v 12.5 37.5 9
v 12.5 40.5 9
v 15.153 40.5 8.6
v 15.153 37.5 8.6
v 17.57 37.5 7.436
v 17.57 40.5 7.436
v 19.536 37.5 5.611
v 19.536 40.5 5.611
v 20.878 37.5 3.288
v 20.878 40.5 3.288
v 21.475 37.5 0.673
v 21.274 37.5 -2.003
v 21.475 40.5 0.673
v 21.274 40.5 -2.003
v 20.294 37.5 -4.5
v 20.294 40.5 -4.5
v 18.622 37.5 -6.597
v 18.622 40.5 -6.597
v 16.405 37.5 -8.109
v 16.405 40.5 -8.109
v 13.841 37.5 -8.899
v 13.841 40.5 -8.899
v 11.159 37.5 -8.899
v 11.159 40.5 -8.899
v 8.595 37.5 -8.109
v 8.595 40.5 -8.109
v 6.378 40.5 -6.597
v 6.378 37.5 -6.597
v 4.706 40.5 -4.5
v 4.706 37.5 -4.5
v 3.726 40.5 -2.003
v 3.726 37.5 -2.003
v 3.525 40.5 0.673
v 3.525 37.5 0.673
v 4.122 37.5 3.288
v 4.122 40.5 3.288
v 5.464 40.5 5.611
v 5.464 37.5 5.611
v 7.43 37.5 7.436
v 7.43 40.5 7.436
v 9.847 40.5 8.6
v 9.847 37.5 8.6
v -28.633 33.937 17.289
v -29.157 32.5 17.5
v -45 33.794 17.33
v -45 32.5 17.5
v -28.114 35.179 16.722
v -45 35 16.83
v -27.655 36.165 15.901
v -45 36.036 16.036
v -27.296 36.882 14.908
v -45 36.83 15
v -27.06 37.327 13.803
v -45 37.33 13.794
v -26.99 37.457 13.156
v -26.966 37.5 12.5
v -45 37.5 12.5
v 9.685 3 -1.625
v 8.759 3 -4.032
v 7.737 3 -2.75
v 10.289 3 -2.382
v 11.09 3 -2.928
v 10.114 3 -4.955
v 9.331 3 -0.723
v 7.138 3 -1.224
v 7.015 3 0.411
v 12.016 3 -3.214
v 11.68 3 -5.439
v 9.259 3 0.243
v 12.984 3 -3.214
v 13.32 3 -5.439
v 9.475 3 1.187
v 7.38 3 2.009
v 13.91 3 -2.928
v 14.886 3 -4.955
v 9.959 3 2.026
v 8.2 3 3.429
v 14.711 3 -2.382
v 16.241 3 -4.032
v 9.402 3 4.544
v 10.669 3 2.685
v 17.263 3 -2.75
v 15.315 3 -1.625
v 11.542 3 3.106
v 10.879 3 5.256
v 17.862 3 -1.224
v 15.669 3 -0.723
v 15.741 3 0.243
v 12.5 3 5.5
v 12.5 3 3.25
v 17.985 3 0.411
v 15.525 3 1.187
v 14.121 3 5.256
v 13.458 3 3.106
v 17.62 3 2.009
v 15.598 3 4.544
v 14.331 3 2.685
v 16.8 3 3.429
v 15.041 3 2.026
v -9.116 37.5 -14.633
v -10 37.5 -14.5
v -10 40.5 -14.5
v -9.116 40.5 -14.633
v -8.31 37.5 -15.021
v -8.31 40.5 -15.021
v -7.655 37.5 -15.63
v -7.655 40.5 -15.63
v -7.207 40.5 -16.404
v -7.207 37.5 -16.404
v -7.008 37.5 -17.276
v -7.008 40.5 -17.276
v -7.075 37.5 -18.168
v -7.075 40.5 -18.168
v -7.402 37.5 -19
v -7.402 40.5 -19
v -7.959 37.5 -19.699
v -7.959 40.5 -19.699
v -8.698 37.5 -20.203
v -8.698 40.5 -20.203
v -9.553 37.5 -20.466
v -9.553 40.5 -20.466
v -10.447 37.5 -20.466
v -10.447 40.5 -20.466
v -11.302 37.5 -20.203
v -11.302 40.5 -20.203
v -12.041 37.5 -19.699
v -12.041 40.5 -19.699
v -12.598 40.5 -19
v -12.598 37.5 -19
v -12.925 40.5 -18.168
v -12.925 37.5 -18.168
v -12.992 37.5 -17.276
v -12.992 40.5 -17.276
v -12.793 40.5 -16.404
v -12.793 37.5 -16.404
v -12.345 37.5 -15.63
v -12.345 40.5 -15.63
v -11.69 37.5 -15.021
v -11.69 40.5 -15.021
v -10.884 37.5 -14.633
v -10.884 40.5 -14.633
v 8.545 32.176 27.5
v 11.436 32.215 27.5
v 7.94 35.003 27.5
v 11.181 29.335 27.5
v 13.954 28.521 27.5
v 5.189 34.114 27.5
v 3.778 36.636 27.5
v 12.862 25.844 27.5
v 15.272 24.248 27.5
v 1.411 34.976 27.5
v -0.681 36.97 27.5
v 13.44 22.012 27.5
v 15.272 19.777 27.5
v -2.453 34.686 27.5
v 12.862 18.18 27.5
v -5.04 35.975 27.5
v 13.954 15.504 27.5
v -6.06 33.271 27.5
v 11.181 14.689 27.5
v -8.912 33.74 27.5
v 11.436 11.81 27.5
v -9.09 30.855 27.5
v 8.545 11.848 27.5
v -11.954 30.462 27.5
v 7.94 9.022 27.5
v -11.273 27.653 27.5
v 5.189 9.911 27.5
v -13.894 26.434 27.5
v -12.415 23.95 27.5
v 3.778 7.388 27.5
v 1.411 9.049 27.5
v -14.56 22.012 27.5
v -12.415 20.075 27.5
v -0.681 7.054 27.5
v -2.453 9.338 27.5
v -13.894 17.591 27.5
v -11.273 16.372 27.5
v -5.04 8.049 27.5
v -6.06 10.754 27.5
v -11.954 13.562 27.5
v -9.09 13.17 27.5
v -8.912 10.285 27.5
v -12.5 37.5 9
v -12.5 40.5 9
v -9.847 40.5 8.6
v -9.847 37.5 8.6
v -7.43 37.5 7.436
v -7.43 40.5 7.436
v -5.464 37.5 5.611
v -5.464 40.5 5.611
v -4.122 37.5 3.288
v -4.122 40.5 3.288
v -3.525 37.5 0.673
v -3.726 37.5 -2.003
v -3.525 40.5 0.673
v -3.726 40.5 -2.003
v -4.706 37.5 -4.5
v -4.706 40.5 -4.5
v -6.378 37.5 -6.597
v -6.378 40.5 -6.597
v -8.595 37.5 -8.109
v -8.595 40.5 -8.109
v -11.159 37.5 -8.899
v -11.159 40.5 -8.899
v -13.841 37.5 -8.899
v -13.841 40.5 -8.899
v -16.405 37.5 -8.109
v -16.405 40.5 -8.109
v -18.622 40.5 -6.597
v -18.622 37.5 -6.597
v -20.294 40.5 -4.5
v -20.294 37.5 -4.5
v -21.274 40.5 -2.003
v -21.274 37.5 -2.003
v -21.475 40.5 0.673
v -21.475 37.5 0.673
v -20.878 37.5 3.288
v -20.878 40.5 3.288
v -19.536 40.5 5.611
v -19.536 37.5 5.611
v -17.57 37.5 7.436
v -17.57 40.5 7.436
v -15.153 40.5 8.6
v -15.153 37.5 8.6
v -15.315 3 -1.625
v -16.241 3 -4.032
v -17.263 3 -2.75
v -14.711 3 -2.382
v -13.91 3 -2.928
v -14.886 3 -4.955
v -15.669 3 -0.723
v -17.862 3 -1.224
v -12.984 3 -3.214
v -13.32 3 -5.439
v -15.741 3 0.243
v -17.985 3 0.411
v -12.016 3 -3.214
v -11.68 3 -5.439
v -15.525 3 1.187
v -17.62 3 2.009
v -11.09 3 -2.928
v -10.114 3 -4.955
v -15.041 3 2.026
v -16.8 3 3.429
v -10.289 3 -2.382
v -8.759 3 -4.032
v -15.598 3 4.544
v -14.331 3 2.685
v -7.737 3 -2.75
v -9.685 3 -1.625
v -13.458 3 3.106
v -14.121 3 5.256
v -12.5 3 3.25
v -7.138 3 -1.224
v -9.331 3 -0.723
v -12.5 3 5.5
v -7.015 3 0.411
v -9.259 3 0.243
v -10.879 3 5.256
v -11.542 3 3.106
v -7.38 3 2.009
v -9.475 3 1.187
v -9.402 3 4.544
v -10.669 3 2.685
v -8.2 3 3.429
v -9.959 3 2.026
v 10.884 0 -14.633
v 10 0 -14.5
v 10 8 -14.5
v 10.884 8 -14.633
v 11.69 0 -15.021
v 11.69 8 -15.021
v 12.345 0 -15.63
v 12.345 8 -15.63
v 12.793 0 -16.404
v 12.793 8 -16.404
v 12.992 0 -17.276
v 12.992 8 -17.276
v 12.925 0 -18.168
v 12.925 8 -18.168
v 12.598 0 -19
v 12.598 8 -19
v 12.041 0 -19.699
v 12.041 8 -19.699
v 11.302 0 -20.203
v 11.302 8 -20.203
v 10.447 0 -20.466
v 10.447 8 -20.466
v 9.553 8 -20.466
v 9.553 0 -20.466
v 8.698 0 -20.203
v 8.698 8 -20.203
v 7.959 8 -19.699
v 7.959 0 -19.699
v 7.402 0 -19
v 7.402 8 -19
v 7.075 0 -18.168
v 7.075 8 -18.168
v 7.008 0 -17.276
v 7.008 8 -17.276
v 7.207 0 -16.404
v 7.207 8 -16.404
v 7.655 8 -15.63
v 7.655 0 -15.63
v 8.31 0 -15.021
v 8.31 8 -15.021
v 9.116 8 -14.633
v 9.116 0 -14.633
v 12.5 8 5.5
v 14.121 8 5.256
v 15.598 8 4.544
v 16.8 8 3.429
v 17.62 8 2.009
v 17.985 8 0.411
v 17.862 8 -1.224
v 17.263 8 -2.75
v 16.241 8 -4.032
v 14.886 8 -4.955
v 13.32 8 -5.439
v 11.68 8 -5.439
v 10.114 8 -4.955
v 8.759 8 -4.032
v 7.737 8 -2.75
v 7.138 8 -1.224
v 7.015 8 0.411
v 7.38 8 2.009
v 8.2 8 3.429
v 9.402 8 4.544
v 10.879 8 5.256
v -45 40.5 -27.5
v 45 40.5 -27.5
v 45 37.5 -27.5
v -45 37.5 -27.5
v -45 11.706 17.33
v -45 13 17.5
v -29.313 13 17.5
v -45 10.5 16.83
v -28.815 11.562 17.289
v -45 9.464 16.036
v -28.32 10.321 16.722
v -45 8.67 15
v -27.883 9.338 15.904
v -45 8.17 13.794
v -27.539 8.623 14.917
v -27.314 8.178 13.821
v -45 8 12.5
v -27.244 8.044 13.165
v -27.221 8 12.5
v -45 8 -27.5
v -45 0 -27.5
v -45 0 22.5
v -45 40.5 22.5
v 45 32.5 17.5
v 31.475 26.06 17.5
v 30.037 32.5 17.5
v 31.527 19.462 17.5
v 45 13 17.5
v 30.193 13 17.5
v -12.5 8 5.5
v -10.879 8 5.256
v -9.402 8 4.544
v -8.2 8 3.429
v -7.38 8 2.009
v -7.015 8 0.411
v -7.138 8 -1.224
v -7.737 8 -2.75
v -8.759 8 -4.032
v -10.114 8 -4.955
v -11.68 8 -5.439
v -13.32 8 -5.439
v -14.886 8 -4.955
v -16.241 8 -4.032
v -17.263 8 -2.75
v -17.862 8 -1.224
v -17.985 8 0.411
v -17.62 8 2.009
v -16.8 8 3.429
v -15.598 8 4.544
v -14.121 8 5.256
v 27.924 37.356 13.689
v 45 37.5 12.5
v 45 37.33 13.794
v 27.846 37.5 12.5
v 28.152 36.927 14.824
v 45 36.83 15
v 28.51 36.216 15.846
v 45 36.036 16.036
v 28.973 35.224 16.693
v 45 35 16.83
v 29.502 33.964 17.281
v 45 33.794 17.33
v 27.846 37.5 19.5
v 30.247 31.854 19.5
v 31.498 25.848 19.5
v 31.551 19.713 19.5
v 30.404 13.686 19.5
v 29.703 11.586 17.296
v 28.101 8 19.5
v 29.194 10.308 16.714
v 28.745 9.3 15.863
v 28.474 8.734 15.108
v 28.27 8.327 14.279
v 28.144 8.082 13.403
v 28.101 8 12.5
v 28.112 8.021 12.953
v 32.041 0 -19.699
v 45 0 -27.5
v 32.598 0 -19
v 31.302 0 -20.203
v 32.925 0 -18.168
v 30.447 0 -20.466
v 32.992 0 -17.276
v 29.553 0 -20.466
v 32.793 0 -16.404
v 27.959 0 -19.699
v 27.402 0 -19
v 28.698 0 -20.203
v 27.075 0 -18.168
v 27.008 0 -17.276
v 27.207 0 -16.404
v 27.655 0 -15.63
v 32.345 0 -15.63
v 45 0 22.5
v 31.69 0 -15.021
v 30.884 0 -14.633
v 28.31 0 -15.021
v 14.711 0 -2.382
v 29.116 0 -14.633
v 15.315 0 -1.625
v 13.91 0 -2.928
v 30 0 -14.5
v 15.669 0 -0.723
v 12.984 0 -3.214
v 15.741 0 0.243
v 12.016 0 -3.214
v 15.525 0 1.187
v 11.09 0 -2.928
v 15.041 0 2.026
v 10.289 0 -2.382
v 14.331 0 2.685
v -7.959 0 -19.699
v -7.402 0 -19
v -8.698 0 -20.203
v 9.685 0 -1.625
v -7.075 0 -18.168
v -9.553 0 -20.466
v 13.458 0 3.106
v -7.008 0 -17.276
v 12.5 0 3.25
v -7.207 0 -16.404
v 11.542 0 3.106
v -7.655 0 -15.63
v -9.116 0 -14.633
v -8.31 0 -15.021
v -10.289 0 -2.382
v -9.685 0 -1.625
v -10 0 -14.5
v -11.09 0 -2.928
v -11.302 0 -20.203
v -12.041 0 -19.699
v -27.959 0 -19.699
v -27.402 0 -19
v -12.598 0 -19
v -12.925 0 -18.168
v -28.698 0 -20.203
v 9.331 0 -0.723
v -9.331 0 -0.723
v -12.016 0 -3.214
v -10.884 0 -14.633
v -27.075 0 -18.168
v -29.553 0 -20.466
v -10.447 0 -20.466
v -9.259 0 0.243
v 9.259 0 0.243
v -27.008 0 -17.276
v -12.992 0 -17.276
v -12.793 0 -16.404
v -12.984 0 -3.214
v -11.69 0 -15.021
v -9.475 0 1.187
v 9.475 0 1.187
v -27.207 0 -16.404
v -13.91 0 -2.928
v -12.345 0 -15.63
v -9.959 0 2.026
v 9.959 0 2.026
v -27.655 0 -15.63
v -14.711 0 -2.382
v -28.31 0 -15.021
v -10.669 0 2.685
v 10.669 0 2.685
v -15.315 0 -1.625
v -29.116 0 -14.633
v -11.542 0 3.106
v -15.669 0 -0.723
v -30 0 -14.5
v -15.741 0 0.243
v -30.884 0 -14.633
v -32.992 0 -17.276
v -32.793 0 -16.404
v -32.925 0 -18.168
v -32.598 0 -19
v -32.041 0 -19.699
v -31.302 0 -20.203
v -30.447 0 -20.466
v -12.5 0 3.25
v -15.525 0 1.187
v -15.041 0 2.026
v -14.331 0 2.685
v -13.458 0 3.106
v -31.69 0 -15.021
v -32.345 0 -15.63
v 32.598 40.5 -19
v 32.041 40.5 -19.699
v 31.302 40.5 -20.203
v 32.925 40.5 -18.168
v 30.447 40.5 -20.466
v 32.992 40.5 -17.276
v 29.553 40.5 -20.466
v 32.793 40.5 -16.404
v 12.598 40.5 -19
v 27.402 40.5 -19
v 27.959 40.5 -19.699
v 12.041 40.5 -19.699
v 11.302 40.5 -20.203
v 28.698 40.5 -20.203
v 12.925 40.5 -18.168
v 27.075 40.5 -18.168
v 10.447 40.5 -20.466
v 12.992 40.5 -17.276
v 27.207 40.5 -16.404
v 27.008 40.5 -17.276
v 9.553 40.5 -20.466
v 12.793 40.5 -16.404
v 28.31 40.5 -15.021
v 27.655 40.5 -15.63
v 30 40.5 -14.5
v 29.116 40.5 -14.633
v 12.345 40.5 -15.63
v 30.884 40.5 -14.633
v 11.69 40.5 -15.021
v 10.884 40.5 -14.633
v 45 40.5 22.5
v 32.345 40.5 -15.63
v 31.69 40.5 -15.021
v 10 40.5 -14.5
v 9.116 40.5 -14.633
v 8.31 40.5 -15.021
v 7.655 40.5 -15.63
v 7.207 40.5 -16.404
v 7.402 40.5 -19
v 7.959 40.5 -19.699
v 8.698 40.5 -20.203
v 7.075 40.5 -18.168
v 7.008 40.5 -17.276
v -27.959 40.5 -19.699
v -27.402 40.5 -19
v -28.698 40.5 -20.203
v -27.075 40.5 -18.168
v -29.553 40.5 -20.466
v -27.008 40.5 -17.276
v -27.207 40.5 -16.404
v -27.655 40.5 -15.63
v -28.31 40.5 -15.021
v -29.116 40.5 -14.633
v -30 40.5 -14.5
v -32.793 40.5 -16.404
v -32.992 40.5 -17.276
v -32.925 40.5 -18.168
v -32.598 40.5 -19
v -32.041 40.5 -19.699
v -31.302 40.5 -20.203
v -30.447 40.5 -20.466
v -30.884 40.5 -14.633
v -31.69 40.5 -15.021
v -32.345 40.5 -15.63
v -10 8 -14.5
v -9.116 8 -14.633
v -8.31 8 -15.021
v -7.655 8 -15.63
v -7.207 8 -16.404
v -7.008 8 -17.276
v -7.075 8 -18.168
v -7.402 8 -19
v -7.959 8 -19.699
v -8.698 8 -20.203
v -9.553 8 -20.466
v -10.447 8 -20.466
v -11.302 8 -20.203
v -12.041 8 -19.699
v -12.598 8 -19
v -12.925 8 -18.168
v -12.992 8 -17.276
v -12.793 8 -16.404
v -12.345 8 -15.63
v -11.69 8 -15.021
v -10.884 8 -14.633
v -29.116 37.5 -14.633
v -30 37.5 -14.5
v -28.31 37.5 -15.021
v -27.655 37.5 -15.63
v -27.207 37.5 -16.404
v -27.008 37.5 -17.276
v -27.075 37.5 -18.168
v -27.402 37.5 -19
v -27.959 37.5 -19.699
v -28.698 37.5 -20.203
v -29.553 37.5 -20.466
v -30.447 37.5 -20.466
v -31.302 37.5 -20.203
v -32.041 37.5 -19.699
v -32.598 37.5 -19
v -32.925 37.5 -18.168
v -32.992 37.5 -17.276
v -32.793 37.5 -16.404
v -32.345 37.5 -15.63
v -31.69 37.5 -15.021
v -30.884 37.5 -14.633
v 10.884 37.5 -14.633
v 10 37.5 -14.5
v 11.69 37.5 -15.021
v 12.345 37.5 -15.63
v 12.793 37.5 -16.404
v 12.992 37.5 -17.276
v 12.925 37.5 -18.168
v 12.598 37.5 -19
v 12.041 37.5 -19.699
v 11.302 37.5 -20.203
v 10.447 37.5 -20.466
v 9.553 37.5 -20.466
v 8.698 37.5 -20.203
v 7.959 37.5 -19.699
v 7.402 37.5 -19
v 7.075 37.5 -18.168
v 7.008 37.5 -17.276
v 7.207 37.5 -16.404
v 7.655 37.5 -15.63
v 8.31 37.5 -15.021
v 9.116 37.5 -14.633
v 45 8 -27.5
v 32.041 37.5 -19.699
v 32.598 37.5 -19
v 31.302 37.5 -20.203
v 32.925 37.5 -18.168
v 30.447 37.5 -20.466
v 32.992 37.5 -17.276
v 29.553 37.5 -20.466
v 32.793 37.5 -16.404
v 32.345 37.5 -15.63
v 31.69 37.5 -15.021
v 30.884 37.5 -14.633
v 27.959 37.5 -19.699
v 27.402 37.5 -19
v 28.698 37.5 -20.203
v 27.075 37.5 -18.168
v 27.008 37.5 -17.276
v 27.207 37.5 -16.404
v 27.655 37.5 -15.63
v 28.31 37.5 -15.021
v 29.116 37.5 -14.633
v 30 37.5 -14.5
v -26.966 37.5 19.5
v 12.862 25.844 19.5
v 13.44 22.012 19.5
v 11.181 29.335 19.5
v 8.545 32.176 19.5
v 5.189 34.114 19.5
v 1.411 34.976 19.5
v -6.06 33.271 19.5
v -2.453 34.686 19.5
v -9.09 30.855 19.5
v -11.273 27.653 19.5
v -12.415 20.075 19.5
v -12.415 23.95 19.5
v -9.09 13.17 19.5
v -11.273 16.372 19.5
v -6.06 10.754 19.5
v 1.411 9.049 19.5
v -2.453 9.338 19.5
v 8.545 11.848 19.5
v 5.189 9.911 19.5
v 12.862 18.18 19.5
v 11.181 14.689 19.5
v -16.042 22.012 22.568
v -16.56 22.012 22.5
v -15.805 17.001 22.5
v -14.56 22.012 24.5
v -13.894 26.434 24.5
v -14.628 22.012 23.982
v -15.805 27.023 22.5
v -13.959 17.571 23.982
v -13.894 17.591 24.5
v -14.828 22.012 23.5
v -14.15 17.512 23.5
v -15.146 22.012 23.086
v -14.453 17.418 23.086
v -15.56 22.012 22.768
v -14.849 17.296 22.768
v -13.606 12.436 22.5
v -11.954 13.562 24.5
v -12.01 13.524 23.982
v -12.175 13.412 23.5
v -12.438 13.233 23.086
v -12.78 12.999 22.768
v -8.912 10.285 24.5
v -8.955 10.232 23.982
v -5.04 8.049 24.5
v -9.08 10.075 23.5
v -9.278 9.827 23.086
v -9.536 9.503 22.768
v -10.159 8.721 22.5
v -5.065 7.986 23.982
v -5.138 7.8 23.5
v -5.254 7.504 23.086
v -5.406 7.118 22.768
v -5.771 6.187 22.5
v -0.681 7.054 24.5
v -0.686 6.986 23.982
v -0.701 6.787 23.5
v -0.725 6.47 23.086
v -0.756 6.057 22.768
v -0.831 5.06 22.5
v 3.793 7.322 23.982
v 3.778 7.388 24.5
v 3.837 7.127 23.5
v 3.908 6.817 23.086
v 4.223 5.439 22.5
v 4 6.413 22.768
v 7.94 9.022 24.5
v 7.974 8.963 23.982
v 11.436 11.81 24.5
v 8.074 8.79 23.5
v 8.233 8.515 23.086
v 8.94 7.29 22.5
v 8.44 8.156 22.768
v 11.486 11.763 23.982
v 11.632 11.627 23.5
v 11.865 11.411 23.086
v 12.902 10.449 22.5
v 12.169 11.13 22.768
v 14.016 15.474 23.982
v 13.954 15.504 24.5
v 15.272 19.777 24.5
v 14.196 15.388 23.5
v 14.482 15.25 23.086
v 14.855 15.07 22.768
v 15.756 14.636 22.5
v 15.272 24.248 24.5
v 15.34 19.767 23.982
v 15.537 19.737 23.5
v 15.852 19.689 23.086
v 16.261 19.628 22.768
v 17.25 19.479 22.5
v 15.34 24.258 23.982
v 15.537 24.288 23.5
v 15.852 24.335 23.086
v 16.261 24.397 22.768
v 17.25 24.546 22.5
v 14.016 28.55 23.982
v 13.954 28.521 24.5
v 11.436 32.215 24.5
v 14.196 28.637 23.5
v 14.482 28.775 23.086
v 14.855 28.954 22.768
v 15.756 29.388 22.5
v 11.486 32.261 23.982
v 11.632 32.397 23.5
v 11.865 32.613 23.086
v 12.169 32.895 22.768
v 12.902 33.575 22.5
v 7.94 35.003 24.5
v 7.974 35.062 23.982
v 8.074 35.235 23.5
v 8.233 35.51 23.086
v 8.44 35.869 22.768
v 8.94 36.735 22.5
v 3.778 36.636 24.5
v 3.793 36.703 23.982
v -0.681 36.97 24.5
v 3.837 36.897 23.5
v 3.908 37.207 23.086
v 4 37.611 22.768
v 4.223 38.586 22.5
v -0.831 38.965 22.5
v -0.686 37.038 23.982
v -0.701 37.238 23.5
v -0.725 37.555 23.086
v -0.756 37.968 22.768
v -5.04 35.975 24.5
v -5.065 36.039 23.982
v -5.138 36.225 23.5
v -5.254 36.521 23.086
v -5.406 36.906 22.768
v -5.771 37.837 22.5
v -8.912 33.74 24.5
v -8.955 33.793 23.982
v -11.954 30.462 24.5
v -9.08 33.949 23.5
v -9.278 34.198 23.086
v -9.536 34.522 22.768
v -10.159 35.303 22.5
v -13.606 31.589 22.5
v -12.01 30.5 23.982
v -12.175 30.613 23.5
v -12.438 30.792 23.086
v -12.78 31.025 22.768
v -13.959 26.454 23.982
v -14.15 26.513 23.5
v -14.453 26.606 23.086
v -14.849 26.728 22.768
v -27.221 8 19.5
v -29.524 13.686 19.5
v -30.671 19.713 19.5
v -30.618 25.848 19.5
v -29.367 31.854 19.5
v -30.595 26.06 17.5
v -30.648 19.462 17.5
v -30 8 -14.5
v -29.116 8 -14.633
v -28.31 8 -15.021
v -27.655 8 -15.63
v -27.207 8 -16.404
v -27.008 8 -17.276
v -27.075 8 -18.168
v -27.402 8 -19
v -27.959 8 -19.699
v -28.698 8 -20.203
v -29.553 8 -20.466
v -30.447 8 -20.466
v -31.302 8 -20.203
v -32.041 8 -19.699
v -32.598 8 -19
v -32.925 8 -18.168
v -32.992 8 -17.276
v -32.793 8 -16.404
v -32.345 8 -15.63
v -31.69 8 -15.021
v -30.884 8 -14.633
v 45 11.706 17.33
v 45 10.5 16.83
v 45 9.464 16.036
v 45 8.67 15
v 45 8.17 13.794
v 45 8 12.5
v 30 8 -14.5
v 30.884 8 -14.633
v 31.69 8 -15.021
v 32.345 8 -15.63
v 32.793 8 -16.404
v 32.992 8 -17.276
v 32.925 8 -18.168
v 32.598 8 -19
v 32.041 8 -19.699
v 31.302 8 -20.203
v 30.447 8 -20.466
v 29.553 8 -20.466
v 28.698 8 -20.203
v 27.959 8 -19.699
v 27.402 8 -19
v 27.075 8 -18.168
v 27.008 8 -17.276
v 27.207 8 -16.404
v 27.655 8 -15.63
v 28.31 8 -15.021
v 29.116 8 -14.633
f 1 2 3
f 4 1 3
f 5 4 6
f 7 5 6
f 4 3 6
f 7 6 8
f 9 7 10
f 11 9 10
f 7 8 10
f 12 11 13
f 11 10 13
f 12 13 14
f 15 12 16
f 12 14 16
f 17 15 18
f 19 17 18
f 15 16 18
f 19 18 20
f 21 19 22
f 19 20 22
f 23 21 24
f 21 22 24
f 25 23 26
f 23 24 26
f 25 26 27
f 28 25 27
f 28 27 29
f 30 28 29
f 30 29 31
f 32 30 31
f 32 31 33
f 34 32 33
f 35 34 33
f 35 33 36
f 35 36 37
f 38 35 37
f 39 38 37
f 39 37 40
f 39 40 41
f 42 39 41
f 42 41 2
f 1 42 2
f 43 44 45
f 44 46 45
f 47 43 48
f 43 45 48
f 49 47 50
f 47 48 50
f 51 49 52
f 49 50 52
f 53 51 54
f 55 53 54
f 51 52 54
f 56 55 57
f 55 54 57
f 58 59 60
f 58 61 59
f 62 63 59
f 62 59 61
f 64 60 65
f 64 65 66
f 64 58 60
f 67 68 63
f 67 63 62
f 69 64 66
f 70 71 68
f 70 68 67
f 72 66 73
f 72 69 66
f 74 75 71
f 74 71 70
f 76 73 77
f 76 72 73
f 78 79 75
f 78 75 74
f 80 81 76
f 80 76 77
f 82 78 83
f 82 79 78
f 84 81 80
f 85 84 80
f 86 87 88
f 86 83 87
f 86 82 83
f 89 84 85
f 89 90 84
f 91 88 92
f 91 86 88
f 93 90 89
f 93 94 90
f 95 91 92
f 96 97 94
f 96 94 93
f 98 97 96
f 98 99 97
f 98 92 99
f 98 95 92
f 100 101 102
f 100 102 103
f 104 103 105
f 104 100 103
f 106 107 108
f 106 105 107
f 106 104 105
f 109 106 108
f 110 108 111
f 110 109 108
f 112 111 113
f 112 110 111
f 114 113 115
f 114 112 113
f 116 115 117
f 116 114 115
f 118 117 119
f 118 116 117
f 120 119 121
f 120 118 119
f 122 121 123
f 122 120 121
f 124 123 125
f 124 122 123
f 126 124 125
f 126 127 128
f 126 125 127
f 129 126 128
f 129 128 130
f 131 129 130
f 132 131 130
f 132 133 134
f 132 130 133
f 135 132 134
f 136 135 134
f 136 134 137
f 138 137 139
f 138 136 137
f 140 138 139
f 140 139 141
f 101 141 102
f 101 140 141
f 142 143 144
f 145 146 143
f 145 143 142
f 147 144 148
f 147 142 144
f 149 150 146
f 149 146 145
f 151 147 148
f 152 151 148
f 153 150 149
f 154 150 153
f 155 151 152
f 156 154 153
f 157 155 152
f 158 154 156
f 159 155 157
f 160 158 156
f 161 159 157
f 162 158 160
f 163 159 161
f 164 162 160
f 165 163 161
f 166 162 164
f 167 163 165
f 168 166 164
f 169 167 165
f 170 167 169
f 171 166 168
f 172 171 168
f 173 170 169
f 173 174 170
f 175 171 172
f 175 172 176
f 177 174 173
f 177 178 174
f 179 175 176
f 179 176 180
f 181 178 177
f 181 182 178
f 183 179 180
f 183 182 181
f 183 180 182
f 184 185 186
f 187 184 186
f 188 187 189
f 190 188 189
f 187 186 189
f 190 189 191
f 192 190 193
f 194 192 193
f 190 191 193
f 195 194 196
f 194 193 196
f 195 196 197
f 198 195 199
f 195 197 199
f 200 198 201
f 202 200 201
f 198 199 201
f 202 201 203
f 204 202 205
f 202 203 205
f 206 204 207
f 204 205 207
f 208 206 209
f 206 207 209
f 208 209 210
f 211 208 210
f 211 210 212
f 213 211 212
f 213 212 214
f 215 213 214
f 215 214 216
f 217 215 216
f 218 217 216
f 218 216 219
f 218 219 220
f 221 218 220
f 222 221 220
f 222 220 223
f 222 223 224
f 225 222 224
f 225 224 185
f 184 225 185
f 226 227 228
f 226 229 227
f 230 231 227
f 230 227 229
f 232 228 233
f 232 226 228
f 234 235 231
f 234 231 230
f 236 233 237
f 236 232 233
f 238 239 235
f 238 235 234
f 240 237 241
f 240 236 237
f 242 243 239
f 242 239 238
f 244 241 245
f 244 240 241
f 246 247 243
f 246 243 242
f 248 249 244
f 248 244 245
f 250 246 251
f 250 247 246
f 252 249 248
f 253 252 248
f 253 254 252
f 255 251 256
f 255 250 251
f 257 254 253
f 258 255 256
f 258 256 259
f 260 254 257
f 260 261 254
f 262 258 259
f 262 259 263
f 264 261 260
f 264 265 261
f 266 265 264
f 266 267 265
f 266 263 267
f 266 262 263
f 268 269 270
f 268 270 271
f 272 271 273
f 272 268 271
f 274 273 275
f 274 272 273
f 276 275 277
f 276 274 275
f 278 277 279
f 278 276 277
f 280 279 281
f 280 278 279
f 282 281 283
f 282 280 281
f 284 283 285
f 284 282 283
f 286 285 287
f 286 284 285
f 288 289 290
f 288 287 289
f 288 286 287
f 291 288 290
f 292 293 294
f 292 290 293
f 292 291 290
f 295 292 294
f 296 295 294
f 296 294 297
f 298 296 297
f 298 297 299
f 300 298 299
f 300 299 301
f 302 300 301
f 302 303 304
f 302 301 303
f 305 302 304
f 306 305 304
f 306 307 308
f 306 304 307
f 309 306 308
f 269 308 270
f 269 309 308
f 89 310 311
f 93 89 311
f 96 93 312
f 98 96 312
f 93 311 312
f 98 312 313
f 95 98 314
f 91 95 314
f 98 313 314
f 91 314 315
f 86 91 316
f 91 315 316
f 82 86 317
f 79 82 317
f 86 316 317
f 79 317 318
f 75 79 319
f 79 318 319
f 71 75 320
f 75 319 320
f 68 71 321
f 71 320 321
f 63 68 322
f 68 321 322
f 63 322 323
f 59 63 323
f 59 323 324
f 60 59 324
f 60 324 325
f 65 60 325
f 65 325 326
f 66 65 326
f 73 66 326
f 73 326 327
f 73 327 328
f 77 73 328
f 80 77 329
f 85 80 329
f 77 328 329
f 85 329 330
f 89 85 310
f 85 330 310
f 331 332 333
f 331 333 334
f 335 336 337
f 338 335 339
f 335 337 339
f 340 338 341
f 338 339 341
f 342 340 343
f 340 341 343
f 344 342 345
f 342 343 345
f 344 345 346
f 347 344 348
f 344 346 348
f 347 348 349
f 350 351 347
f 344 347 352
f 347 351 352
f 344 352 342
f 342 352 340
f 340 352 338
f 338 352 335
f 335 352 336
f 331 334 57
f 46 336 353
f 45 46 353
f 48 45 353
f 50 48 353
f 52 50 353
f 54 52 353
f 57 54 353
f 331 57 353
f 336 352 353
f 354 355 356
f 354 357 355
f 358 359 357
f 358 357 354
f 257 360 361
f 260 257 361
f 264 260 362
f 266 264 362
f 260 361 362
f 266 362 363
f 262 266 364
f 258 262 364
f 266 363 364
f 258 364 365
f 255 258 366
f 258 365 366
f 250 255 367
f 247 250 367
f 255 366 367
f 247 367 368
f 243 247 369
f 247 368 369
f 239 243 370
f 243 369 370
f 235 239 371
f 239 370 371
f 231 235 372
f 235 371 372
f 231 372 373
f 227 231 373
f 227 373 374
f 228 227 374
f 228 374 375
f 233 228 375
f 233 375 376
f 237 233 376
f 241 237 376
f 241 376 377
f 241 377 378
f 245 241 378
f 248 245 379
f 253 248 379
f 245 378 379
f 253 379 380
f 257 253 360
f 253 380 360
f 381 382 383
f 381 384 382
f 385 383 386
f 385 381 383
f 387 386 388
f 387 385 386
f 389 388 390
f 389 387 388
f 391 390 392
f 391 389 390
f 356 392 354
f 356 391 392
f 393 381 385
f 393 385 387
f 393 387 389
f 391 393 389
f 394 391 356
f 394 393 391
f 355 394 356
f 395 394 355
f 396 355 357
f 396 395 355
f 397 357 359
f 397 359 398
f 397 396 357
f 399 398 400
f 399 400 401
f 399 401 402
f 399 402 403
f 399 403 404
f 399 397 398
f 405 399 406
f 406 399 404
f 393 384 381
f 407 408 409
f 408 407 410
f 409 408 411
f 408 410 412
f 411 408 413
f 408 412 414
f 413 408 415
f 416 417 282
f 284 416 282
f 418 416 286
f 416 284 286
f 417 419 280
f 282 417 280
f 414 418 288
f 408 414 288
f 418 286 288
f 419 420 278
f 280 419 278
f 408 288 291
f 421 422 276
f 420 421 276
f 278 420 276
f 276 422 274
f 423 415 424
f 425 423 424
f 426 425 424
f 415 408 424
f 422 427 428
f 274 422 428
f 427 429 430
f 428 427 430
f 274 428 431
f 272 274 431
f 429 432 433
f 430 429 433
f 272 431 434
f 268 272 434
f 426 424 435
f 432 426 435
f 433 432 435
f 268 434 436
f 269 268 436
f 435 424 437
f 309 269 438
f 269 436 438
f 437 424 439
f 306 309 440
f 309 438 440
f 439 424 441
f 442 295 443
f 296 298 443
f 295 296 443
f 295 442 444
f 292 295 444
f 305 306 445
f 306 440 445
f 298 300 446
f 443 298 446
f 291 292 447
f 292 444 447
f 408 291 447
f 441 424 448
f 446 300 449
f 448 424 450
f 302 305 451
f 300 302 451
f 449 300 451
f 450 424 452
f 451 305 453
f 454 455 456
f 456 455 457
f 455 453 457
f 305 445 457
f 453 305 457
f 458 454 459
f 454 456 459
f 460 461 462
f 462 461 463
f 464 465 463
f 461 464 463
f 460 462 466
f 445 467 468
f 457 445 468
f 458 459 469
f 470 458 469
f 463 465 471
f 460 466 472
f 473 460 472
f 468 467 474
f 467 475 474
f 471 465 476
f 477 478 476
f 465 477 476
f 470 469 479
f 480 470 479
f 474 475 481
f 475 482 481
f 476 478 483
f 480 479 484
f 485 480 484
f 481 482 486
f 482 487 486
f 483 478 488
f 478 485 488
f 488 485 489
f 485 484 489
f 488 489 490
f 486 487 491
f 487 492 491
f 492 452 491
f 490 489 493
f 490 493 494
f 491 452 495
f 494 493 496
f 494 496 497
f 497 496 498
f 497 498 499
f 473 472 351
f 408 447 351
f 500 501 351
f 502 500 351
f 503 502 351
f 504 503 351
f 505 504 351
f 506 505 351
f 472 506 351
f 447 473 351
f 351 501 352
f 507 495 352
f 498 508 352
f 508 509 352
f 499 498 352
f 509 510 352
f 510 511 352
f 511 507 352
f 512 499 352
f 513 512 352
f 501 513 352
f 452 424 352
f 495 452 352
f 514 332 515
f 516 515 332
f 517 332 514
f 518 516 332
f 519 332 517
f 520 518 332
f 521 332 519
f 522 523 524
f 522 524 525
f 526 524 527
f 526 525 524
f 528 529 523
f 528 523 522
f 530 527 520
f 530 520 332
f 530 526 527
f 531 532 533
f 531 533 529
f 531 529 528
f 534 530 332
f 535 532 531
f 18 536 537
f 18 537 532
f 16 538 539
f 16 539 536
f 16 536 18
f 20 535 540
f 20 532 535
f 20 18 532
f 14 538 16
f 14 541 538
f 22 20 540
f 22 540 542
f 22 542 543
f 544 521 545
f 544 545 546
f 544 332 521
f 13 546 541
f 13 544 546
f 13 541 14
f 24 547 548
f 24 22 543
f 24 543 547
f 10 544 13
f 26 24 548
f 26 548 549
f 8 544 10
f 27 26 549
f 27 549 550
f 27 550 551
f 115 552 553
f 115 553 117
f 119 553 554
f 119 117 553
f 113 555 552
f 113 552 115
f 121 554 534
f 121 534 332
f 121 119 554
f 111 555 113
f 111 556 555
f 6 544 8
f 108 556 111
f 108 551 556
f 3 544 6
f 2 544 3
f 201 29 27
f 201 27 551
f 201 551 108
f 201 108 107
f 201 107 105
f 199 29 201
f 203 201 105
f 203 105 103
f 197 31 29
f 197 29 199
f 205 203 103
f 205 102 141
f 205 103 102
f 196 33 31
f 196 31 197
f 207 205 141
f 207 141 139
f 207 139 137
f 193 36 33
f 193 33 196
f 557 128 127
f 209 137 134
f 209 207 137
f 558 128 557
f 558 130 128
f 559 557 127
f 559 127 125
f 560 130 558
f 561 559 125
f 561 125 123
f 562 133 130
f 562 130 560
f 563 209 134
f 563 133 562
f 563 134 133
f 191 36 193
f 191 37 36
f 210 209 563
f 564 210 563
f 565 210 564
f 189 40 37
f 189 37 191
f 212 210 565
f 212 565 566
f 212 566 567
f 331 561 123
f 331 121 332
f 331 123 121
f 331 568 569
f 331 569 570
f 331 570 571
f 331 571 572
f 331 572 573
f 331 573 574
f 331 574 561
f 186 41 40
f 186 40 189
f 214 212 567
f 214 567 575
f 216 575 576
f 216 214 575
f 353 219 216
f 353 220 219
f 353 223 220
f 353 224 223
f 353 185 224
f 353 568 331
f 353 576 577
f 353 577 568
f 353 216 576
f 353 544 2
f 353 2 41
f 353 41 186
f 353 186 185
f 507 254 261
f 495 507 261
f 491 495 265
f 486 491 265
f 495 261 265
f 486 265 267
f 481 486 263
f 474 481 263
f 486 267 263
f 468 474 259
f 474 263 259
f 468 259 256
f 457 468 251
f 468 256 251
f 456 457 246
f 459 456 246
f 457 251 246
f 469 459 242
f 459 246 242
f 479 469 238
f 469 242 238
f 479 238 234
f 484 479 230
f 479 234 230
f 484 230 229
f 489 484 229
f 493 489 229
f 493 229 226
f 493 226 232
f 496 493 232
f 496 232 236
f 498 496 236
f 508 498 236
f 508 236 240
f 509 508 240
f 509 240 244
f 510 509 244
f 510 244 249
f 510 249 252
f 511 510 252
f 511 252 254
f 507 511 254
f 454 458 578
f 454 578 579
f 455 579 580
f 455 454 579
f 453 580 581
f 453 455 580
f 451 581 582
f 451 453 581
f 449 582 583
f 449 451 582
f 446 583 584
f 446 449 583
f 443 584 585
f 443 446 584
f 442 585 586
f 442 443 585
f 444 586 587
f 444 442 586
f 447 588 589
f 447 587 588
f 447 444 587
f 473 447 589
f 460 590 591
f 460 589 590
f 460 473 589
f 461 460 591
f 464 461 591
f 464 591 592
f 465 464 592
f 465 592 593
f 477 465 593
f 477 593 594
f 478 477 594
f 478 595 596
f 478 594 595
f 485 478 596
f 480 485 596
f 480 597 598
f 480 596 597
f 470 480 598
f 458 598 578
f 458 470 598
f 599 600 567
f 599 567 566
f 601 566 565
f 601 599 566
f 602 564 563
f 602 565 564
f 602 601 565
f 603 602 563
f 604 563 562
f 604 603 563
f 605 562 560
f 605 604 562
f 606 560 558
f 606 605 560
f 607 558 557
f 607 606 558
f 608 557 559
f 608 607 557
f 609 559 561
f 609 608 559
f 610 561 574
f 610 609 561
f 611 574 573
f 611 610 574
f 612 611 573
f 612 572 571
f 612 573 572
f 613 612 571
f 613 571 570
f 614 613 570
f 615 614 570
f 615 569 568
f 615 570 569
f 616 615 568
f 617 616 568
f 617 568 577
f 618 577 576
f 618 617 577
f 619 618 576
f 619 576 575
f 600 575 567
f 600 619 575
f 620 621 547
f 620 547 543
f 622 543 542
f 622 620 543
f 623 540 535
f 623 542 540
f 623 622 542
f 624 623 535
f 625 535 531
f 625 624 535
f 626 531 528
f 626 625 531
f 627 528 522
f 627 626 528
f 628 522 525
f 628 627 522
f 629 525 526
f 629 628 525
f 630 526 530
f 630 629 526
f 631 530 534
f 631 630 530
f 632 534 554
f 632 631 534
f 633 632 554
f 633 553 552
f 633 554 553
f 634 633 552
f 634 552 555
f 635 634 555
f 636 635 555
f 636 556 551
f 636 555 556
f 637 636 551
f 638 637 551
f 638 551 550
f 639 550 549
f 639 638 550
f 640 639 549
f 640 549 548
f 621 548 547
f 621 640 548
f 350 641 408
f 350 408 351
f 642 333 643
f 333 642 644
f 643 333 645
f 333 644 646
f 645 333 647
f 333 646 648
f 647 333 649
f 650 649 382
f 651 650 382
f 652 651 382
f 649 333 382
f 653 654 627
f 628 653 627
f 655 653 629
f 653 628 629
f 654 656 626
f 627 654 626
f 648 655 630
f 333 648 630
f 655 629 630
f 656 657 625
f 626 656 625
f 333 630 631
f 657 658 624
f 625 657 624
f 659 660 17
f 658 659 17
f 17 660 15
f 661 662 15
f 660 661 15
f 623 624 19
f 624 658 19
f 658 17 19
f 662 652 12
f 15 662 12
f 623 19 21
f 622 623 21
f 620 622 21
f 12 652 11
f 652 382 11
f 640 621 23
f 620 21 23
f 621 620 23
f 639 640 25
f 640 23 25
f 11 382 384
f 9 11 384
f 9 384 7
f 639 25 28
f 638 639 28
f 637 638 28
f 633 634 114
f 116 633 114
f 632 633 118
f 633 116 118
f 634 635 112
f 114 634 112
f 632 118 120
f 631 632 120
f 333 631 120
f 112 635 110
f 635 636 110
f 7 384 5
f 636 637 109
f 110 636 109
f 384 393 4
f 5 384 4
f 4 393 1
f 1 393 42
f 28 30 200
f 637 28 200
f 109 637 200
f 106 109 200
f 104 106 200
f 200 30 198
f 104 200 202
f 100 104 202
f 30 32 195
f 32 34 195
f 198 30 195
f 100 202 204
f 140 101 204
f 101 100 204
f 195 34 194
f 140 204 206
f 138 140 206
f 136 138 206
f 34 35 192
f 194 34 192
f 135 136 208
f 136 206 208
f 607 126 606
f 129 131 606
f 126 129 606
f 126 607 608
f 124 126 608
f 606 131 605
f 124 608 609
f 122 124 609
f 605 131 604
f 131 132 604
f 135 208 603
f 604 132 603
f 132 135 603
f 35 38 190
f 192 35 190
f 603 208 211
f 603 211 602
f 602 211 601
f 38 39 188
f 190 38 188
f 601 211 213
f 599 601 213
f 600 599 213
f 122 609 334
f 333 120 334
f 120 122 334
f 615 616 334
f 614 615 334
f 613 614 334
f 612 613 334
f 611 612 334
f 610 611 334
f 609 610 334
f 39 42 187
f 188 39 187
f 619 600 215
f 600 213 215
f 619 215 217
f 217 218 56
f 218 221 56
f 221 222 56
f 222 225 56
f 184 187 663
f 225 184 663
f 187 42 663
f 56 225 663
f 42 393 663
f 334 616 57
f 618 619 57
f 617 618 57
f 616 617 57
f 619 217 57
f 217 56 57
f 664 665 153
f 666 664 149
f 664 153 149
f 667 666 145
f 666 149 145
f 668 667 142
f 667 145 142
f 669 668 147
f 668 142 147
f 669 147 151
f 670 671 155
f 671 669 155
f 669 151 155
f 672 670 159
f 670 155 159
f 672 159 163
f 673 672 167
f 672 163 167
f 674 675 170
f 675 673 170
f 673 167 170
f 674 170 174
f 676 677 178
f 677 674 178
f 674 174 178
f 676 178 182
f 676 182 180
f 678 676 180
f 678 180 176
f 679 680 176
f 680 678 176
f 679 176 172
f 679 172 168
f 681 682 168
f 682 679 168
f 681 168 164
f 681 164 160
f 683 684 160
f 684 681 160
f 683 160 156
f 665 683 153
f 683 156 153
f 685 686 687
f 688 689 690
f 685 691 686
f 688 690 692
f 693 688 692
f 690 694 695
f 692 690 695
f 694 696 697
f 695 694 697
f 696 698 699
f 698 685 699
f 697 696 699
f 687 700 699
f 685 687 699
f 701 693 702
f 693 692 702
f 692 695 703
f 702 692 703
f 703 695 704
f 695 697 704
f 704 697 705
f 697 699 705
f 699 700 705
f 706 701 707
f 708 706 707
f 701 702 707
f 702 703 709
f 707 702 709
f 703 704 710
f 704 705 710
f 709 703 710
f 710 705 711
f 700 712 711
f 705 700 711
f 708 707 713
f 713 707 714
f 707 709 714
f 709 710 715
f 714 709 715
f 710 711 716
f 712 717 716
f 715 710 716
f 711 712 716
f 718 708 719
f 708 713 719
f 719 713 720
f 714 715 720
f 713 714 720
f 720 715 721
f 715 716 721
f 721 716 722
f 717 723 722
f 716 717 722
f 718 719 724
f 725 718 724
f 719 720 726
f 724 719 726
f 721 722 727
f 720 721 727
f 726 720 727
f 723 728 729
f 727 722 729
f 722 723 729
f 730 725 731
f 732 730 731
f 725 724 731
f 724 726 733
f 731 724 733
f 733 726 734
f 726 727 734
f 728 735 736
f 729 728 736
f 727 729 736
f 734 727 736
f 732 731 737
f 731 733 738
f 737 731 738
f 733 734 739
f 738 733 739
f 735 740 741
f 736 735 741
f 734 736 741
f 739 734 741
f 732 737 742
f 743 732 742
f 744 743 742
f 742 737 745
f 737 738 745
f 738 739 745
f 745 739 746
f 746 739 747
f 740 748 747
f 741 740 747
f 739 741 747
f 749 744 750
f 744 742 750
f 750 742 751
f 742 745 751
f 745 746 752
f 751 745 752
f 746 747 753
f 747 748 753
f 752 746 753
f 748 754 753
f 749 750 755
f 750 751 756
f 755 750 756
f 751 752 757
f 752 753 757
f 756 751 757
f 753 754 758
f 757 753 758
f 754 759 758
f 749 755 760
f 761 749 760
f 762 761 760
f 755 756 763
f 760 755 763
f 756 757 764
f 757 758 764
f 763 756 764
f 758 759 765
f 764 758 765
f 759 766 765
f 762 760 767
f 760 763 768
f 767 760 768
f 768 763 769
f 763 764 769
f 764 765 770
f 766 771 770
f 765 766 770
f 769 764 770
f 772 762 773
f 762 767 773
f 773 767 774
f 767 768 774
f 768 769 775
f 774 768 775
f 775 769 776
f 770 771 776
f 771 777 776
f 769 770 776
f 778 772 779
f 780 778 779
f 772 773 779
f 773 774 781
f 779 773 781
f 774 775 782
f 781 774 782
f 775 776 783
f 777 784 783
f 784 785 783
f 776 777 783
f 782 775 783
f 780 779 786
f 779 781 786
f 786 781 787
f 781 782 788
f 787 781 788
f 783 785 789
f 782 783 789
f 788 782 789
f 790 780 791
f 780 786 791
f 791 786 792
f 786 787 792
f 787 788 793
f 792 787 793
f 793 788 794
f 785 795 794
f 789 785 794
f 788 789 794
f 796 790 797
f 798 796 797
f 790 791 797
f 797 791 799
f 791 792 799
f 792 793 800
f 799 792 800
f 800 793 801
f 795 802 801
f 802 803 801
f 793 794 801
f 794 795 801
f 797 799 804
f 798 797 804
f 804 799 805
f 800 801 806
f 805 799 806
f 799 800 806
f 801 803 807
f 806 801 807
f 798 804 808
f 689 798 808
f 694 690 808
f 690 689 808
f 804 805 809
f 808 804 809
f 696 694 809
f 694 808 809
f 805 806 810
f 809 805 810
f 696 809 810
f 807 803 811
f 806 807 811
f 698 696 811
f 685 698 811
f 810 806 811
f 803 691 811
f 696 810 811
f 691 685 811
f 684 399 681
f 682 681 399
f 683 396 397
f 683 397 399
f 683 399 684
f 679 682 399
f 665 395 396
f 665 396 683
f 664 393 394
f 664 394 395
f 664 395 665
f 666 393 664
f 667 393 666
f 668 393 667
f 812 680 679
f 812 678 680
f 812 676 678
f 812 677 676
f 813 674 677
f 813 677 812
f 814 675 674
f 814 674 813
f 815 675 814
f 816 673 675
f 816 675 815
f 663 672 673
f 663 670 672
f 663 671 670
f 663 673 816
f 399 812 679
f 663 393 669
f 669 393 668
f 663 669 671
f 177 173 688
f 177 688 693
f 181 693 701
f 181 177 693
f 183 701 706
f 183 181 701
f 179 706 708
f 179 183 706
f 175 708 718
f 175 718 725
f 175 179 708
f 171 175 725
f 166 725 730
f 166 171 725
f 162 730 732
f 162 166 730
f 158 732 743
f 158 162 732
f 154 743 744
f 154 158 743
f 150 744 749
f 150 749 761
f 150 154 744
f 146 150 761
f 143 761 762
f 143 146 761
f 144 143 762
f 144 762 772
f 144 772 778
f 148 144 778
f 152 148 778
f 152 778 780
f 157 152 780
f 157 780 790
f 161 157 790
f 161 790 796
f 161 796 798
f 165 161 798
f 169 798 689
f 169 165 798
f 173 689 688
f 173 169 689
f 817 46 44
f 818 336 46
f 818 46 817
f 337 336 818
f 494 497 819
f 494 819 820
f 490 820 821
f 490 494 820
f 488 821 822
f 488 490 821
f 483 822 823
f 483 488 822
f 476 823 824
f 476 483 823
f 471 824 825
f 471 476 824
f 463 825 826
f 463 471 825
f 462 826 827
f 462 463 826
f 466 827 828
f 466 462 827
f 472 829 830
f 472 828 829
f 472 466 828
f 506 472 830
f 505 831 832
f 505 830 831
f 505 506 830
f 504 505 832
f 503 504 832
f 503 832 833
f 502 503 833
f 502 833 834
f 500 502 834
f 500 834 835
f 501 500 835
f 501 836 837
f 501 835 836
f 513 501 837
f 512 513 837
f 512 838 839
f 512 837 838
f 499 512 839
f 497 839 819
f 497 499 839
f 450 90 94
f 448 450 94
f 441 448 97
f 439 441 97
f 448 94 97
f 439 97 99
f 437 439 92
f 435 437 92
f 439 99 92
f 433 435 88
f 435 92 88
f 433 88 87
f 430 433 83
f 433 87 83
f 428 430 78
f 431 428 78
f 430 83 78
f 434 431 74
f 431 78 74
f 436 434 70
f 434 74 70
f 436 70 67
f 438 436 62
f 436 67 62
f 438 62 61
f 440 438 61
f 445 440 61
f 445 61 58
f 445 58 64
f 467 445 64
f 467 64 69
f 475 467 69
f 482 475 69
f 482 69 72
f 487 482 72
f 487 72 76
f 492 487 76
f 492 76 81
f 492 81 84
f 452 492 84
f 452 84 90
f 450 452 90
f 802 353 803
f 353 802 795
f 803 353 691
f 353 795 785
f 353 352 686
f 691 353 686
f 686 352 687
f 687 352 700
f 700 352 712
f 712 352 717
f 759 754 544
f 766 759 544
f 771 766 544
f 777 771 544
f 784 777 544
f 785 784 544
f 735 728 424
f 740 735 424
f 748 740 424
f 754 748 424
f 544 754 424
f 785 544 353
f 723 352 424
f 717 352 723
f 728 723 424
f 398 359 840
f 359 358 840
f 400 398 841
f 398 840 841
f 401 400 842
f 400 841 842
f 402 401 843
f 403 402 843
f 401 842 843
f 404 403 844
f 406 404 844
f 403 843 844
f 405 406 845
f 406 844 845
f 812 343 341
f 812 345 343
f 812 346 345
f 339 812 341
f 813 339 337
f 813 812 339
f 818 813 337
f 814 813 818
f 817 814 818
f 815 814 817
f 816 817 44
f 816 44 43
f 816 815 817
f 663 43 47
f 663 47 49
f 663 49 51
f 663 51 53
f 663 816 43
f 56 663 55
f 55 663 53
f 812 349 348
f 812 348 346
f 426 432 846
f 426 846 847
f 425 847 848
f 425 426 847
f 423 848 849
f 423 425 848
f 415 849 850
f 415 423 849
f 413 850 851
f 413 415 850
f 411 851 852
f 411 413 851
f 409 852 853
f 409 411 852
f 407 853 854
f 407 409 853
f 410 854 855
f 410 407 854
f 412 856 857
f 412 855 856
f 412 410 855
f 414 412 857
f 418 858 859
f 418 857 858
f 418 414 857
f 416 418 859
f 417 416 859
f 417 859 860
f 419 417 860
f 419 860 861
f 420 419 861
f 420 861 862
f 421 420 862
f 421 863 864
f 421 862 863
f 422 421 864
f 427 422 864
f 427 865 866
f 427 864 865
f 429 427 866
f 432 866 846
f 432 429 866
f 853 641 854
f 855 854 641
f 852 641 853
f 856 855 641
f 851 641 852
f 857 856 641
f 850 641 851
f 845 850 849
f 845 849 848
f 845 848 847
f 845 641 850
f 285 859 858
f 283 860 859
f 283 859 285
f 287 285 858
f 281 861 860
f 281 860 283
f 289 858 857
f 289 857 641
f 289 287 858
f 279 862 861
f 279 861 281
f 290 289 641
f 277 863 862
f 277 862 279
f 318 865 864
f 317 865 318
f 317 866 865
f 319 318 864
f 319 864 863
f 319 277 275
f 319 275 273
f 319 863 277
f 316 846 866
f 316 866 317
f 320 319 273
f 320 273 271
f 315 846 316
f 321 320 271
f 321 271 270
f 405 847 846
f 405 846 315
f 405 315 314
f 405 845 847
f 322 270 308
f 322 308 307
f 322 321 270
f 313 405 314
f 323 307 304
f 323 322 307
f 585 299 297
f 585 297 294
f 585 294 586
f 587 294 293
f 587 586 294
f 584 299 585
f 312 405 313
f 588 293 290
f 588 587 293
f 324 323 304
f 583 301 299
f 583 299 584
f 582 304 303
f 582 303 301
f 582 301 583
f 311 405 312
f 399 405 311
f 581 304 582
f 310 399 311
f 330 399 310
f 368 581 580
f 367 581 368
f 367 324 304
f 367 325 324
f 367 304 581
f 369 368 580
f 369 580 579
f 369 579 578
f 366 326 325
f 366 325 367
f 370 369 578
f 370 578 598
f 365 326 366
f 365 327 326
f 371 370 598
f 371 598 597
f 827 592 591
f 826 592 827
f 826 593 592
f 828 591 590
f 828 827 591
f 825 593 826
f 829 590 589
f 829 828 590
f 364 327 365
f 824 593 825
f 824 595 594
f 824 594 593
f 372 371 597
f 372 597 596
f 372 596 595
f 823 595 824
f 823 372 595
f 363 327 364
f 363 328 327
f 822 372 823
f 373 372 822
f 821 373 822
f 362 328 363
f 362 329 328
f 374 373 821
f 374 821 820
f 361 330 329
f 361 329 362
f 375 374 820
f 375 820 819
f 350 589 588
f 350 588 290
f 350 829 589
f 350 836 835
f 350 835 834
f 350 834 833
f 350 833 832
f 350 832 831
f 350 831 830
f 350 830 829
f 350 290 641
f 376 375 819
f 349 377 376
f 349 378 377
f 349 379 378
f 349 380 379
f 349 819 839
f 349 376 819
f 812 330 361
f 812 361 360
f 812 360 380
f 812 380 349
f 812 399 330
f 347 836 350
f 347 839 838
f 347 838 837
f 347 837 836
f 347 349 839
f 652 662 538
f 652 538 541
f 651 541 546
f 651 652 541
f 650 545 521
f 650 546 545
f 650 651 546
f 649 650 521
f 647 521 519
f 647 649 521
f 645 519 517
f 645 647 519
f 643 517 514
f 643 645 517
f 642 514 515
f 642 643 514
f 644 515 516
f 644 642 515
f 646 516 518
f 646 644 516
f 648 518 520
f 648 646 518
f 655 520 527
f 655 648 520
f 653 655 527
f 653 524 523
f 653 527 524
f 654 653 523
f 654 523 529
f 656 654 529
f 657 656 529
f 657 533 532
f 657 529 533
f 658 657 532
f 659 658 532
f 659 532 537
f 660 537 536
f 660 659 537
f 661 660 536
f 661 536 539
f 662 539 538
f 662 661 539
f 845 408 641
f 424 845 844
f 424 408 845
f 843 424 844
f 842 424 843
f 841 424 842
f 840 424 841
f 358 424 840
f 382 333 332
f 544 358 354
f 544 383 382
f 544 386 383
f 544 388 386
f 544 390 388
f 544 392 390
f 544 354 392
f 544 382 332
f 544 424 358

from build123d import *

# Parameters (mm, degrees)
SKETCH2_W               = 90
SKETCH2_H               = 45
BOSS_EXTRUDE1_DEPTH     = 8
SKETCH3_R               = 3.25
CUT_EXTRUDE1_DEPTH      = 10
SKETCH5_R               = 5.5
CUT_EXTRUDE2_DEPTH      = 5
SKETCH6_W               = 90
SKETCH6_H               = 5
BOSS_EXTRUDE2_DEPTH     = 32.5
SKETCH7_W               = 90
SKETCH7_H               = 3
BOSS_EXTRUDE3_DEPTH     = 45
SKETCH8_R               = 13
CUT_EXTRUDE4_DEPTH      = 13
BOSS_EXTRUDE6_START     = 5
SKETCH11_R              = 15
SKETCH11_R_2            = 13
BOSS_EXTRUDE6_DEPTH     = 5
FILLET1_R               = 2
CUT_EXTRUDE5_START      = -2
SKETCH12_R              = 13
CUT_EXTRUDE5_DEPTH      = 2
CUT_EXTRUDE6_DEPTH      = 67.494360663
CUT_EXTRUDE6_DEPTH_BACK = 67.494360663
SKETCH13_R              = 3
SKETCH14_R              = 9
CUT_EXTRUDE7_DEPTH      = 12
SKETCH16_W              = 90
SKETCH16_H              = 8
BOSS_EXTRUDE7_DEPTH     = 5
FILLET2_R               = 5


with BuildPart() as part:
    # Sketch2 → Boss-Extrude1 (new body)
    with BuildSketch(Plane(origin=(0, 0, 0), x_dir=(1, 0, 0), z_dir=(0, 1, 0))):
        Rectangle(SKETCH2_W, SKETCH2_H)
    extrude(amount=BOSS_EXTRUDE1_DEPTH)

    # Sketch3 → Cut-Extrude1 (cut)
    with BuildSketch(Plane(origin=(0, 8, 0), x_dir=(1, 0, 0), z_dir=(0, 1, 0))):
        with Locations(Location((12.5, 0, 0), (0, 0, 270))):
            Circle(SKETCH3_R)
        with Locations(Location((-12.5, 0, 0), (0, 0, 270))):
            Circle(SKETCH3_R)
    extrude(amount=-CUT_EXTRUDE1_DEPTH, mode=Mode.SUBTRACT)

    # Sketch5 → Cut-Extrude2 (cut)
    with BuildSketch(Plane(origin=(0, 8, 0), x_dir=(1, 0, 0), z_dir=(0, 1, 0))):
        with Locations(Location((-12.5, 0, 0), (0, 0, 270))):
            Circle(SKETCH5_R)
        with Locations(Location((12.5, 0, 0), (0, 0, 270))):
            Circle(SKETCH5_R)
    extrude(amount=-CUT_EXTRUDE2_DEPTH, mode=Mode.SUBTRACT)

    # Sketch6 → Boss-Extrude2 (add)
    with BuildSketch(Plane(origin=(0, 8, 0), x_dir=(1, 0, 0), z_dir=(0, 1, 0))):
        with Locations((0, -20)):
            Rectangle(SKETCH6_W, SKETCH6_H)
    extrude(amount=BOSS_EXTRUDE2_DEPTH)

    # Sketch7 → Boss-Extrude3 (add)
    with BuildSketch(Plane(origin=(0, 0, 17.5), x_dir=(-1, 0, 0), z_dir=(0, 0, -1))):
        with Locations((0, 39)):
            Rectangle(SKETCH7_W, SKETCH7_H)
    extrude(amount=BOSS_EXTRUDE3_DEPTH)

    # Sketch8 → Cut-Extrude4 (cut)
    with BuildSketch(Plane.XY.offset(22.5)):
        with Locations((0.439882225, 22.012295082)):
            Circle(SKETCH8_R)
    extrude(amount=-CUT_EXTRUDE4_DEPTH, mode=Mode.SUBTRACT)

    # Sketch11 → Boss-Extrude6 (add)
    with BuildSketch(Plane.XY.offset(22.5).offset(BOSS_EXTRUDE6_START)):
        with Locations(Location((0.439882225, 22.012295082, 0), (0, 0, 180))):
            Circle(SKETCH11_R)
        with Locations((0.439882225, 22.012295082)):
            Circle(SKETCH11_R_2, mode=Mode.SUBTRACT)
    extrude(amount=-BOSS_EXTRUDE6_DEPTH)

    # Fillet1
    fillet1_edges = [part.edges().sort_by_distance(p)[0] for p in [
        (15.439882225, 22.012295082, 22.5),
    ]]
    fillet(fillet1_edges, radius=FILLET1_R)

    # Sketch12 → Cut-Extrude5 (cut)
    with BuildSketch(Plane(origin=(0, 0, 17.5), x_dir=(-1, 0, 0), z_dir=(0, 0, -1)).offset(CUT_EXTRUDE5_START)):
        with BuildLine():
            Line((-28.100883588, 8), (27.221119137, 8))
            ThreePointArc((27.221119137, 8), (30.795754245, 22.781960072), (26.966438327, 37.5))
            Line((26.966438327, 37.5), (-27.846202777, 37.5))
            ThreePointArc((-27.846202777, 37.5), (-31.675518695, 22.781960072), (-28.100883588, 8))
        make_face()
        with Locations(Location((-0.439882225, 22.012295082, 0), (0, 0, 180))):
            Circle(SKETCH12_R, mode=Mode.SUBTRACT)
    extrude(amount=CUT_EXTRUDE5_DEPTH, mode=Mode.SUBTRACT)

    # Sketch13 → Cut-Extrude6 (cut, two sides: drawn at the far end of the back side and taken through both)
    with BuildSketch(Plane(origin=(0, 40.5, 0), x_dir=(1, 0, 0), z_dir=(0, 1, 0)).offset(-CUT_EXTRUDE6_DEPTH_BACK)):
        with Locations(Location((-30, 17.5, 0), (0, 0, 270))):
            Circle(SKETCH13_R)
        with Locations(Location((-10, 17.5, 0), (0, 0, 270))):
            Circle(SKETCH13_R)
        with Locations(Location((10, 17.5, 0), (0, 0, 270))):
            Circle(SKETCH13_R)
        with Locations(Location((30, 17.5, 0), (0, 0, 270))):
            Circle(SKETCH13_R)
    extrude(amount=CUT_EXTRUDE6_DEPTH + CUT_EXTRUDE6_DEPTH_BACK, mode=Mode.SUBTRACT)

    # Sketch14 → Cut-Extrude7 (cut)
    with BuildSketch(Plane(origin=(0, 40.5, 0), x_dir=(1, 0, 0), z_dir=(0, 1, 0))):
        with Locations(Location((-12.5, 0, 0), (0, 0, 270))):
            Circle(SKETCH14_R)
        with Locations(Location((12.5, 0, 0), (0, 0, 270))):
            Circle(SKETCH14_R)
    extrude(amount=-CUT_EXTRUDE7_DEPTH, mode=Mode.SUBTRACT)

    # Sketch16 → Boss-Extrude7 (add)
    with BuildSketch(Plane(origin=(0, 0, -22.5), x_dir=(-1, 0, 0), z_dir=(0, 0, -1))):
        with Locations((0, 4)):
            Rectangle(SKETCH16_W, SKETCH16_H)
    extrude(amount=BOSS_EXTRUDE7_DEPTH)

    # Fillet2
    fillet2_edges = [part.edges().sort_by_distance(p)[0] for p in [
        (36.550441794, 8, 17.5),
        (36.423101389, 37.5, 17.5),
        (-35.983219164, 37.5, 17.5),
        (-36.110559569, 8, 17.5),
    ]]
    fillet(fillet2_edges, radius=FILLET2_R)


solid = part.part
